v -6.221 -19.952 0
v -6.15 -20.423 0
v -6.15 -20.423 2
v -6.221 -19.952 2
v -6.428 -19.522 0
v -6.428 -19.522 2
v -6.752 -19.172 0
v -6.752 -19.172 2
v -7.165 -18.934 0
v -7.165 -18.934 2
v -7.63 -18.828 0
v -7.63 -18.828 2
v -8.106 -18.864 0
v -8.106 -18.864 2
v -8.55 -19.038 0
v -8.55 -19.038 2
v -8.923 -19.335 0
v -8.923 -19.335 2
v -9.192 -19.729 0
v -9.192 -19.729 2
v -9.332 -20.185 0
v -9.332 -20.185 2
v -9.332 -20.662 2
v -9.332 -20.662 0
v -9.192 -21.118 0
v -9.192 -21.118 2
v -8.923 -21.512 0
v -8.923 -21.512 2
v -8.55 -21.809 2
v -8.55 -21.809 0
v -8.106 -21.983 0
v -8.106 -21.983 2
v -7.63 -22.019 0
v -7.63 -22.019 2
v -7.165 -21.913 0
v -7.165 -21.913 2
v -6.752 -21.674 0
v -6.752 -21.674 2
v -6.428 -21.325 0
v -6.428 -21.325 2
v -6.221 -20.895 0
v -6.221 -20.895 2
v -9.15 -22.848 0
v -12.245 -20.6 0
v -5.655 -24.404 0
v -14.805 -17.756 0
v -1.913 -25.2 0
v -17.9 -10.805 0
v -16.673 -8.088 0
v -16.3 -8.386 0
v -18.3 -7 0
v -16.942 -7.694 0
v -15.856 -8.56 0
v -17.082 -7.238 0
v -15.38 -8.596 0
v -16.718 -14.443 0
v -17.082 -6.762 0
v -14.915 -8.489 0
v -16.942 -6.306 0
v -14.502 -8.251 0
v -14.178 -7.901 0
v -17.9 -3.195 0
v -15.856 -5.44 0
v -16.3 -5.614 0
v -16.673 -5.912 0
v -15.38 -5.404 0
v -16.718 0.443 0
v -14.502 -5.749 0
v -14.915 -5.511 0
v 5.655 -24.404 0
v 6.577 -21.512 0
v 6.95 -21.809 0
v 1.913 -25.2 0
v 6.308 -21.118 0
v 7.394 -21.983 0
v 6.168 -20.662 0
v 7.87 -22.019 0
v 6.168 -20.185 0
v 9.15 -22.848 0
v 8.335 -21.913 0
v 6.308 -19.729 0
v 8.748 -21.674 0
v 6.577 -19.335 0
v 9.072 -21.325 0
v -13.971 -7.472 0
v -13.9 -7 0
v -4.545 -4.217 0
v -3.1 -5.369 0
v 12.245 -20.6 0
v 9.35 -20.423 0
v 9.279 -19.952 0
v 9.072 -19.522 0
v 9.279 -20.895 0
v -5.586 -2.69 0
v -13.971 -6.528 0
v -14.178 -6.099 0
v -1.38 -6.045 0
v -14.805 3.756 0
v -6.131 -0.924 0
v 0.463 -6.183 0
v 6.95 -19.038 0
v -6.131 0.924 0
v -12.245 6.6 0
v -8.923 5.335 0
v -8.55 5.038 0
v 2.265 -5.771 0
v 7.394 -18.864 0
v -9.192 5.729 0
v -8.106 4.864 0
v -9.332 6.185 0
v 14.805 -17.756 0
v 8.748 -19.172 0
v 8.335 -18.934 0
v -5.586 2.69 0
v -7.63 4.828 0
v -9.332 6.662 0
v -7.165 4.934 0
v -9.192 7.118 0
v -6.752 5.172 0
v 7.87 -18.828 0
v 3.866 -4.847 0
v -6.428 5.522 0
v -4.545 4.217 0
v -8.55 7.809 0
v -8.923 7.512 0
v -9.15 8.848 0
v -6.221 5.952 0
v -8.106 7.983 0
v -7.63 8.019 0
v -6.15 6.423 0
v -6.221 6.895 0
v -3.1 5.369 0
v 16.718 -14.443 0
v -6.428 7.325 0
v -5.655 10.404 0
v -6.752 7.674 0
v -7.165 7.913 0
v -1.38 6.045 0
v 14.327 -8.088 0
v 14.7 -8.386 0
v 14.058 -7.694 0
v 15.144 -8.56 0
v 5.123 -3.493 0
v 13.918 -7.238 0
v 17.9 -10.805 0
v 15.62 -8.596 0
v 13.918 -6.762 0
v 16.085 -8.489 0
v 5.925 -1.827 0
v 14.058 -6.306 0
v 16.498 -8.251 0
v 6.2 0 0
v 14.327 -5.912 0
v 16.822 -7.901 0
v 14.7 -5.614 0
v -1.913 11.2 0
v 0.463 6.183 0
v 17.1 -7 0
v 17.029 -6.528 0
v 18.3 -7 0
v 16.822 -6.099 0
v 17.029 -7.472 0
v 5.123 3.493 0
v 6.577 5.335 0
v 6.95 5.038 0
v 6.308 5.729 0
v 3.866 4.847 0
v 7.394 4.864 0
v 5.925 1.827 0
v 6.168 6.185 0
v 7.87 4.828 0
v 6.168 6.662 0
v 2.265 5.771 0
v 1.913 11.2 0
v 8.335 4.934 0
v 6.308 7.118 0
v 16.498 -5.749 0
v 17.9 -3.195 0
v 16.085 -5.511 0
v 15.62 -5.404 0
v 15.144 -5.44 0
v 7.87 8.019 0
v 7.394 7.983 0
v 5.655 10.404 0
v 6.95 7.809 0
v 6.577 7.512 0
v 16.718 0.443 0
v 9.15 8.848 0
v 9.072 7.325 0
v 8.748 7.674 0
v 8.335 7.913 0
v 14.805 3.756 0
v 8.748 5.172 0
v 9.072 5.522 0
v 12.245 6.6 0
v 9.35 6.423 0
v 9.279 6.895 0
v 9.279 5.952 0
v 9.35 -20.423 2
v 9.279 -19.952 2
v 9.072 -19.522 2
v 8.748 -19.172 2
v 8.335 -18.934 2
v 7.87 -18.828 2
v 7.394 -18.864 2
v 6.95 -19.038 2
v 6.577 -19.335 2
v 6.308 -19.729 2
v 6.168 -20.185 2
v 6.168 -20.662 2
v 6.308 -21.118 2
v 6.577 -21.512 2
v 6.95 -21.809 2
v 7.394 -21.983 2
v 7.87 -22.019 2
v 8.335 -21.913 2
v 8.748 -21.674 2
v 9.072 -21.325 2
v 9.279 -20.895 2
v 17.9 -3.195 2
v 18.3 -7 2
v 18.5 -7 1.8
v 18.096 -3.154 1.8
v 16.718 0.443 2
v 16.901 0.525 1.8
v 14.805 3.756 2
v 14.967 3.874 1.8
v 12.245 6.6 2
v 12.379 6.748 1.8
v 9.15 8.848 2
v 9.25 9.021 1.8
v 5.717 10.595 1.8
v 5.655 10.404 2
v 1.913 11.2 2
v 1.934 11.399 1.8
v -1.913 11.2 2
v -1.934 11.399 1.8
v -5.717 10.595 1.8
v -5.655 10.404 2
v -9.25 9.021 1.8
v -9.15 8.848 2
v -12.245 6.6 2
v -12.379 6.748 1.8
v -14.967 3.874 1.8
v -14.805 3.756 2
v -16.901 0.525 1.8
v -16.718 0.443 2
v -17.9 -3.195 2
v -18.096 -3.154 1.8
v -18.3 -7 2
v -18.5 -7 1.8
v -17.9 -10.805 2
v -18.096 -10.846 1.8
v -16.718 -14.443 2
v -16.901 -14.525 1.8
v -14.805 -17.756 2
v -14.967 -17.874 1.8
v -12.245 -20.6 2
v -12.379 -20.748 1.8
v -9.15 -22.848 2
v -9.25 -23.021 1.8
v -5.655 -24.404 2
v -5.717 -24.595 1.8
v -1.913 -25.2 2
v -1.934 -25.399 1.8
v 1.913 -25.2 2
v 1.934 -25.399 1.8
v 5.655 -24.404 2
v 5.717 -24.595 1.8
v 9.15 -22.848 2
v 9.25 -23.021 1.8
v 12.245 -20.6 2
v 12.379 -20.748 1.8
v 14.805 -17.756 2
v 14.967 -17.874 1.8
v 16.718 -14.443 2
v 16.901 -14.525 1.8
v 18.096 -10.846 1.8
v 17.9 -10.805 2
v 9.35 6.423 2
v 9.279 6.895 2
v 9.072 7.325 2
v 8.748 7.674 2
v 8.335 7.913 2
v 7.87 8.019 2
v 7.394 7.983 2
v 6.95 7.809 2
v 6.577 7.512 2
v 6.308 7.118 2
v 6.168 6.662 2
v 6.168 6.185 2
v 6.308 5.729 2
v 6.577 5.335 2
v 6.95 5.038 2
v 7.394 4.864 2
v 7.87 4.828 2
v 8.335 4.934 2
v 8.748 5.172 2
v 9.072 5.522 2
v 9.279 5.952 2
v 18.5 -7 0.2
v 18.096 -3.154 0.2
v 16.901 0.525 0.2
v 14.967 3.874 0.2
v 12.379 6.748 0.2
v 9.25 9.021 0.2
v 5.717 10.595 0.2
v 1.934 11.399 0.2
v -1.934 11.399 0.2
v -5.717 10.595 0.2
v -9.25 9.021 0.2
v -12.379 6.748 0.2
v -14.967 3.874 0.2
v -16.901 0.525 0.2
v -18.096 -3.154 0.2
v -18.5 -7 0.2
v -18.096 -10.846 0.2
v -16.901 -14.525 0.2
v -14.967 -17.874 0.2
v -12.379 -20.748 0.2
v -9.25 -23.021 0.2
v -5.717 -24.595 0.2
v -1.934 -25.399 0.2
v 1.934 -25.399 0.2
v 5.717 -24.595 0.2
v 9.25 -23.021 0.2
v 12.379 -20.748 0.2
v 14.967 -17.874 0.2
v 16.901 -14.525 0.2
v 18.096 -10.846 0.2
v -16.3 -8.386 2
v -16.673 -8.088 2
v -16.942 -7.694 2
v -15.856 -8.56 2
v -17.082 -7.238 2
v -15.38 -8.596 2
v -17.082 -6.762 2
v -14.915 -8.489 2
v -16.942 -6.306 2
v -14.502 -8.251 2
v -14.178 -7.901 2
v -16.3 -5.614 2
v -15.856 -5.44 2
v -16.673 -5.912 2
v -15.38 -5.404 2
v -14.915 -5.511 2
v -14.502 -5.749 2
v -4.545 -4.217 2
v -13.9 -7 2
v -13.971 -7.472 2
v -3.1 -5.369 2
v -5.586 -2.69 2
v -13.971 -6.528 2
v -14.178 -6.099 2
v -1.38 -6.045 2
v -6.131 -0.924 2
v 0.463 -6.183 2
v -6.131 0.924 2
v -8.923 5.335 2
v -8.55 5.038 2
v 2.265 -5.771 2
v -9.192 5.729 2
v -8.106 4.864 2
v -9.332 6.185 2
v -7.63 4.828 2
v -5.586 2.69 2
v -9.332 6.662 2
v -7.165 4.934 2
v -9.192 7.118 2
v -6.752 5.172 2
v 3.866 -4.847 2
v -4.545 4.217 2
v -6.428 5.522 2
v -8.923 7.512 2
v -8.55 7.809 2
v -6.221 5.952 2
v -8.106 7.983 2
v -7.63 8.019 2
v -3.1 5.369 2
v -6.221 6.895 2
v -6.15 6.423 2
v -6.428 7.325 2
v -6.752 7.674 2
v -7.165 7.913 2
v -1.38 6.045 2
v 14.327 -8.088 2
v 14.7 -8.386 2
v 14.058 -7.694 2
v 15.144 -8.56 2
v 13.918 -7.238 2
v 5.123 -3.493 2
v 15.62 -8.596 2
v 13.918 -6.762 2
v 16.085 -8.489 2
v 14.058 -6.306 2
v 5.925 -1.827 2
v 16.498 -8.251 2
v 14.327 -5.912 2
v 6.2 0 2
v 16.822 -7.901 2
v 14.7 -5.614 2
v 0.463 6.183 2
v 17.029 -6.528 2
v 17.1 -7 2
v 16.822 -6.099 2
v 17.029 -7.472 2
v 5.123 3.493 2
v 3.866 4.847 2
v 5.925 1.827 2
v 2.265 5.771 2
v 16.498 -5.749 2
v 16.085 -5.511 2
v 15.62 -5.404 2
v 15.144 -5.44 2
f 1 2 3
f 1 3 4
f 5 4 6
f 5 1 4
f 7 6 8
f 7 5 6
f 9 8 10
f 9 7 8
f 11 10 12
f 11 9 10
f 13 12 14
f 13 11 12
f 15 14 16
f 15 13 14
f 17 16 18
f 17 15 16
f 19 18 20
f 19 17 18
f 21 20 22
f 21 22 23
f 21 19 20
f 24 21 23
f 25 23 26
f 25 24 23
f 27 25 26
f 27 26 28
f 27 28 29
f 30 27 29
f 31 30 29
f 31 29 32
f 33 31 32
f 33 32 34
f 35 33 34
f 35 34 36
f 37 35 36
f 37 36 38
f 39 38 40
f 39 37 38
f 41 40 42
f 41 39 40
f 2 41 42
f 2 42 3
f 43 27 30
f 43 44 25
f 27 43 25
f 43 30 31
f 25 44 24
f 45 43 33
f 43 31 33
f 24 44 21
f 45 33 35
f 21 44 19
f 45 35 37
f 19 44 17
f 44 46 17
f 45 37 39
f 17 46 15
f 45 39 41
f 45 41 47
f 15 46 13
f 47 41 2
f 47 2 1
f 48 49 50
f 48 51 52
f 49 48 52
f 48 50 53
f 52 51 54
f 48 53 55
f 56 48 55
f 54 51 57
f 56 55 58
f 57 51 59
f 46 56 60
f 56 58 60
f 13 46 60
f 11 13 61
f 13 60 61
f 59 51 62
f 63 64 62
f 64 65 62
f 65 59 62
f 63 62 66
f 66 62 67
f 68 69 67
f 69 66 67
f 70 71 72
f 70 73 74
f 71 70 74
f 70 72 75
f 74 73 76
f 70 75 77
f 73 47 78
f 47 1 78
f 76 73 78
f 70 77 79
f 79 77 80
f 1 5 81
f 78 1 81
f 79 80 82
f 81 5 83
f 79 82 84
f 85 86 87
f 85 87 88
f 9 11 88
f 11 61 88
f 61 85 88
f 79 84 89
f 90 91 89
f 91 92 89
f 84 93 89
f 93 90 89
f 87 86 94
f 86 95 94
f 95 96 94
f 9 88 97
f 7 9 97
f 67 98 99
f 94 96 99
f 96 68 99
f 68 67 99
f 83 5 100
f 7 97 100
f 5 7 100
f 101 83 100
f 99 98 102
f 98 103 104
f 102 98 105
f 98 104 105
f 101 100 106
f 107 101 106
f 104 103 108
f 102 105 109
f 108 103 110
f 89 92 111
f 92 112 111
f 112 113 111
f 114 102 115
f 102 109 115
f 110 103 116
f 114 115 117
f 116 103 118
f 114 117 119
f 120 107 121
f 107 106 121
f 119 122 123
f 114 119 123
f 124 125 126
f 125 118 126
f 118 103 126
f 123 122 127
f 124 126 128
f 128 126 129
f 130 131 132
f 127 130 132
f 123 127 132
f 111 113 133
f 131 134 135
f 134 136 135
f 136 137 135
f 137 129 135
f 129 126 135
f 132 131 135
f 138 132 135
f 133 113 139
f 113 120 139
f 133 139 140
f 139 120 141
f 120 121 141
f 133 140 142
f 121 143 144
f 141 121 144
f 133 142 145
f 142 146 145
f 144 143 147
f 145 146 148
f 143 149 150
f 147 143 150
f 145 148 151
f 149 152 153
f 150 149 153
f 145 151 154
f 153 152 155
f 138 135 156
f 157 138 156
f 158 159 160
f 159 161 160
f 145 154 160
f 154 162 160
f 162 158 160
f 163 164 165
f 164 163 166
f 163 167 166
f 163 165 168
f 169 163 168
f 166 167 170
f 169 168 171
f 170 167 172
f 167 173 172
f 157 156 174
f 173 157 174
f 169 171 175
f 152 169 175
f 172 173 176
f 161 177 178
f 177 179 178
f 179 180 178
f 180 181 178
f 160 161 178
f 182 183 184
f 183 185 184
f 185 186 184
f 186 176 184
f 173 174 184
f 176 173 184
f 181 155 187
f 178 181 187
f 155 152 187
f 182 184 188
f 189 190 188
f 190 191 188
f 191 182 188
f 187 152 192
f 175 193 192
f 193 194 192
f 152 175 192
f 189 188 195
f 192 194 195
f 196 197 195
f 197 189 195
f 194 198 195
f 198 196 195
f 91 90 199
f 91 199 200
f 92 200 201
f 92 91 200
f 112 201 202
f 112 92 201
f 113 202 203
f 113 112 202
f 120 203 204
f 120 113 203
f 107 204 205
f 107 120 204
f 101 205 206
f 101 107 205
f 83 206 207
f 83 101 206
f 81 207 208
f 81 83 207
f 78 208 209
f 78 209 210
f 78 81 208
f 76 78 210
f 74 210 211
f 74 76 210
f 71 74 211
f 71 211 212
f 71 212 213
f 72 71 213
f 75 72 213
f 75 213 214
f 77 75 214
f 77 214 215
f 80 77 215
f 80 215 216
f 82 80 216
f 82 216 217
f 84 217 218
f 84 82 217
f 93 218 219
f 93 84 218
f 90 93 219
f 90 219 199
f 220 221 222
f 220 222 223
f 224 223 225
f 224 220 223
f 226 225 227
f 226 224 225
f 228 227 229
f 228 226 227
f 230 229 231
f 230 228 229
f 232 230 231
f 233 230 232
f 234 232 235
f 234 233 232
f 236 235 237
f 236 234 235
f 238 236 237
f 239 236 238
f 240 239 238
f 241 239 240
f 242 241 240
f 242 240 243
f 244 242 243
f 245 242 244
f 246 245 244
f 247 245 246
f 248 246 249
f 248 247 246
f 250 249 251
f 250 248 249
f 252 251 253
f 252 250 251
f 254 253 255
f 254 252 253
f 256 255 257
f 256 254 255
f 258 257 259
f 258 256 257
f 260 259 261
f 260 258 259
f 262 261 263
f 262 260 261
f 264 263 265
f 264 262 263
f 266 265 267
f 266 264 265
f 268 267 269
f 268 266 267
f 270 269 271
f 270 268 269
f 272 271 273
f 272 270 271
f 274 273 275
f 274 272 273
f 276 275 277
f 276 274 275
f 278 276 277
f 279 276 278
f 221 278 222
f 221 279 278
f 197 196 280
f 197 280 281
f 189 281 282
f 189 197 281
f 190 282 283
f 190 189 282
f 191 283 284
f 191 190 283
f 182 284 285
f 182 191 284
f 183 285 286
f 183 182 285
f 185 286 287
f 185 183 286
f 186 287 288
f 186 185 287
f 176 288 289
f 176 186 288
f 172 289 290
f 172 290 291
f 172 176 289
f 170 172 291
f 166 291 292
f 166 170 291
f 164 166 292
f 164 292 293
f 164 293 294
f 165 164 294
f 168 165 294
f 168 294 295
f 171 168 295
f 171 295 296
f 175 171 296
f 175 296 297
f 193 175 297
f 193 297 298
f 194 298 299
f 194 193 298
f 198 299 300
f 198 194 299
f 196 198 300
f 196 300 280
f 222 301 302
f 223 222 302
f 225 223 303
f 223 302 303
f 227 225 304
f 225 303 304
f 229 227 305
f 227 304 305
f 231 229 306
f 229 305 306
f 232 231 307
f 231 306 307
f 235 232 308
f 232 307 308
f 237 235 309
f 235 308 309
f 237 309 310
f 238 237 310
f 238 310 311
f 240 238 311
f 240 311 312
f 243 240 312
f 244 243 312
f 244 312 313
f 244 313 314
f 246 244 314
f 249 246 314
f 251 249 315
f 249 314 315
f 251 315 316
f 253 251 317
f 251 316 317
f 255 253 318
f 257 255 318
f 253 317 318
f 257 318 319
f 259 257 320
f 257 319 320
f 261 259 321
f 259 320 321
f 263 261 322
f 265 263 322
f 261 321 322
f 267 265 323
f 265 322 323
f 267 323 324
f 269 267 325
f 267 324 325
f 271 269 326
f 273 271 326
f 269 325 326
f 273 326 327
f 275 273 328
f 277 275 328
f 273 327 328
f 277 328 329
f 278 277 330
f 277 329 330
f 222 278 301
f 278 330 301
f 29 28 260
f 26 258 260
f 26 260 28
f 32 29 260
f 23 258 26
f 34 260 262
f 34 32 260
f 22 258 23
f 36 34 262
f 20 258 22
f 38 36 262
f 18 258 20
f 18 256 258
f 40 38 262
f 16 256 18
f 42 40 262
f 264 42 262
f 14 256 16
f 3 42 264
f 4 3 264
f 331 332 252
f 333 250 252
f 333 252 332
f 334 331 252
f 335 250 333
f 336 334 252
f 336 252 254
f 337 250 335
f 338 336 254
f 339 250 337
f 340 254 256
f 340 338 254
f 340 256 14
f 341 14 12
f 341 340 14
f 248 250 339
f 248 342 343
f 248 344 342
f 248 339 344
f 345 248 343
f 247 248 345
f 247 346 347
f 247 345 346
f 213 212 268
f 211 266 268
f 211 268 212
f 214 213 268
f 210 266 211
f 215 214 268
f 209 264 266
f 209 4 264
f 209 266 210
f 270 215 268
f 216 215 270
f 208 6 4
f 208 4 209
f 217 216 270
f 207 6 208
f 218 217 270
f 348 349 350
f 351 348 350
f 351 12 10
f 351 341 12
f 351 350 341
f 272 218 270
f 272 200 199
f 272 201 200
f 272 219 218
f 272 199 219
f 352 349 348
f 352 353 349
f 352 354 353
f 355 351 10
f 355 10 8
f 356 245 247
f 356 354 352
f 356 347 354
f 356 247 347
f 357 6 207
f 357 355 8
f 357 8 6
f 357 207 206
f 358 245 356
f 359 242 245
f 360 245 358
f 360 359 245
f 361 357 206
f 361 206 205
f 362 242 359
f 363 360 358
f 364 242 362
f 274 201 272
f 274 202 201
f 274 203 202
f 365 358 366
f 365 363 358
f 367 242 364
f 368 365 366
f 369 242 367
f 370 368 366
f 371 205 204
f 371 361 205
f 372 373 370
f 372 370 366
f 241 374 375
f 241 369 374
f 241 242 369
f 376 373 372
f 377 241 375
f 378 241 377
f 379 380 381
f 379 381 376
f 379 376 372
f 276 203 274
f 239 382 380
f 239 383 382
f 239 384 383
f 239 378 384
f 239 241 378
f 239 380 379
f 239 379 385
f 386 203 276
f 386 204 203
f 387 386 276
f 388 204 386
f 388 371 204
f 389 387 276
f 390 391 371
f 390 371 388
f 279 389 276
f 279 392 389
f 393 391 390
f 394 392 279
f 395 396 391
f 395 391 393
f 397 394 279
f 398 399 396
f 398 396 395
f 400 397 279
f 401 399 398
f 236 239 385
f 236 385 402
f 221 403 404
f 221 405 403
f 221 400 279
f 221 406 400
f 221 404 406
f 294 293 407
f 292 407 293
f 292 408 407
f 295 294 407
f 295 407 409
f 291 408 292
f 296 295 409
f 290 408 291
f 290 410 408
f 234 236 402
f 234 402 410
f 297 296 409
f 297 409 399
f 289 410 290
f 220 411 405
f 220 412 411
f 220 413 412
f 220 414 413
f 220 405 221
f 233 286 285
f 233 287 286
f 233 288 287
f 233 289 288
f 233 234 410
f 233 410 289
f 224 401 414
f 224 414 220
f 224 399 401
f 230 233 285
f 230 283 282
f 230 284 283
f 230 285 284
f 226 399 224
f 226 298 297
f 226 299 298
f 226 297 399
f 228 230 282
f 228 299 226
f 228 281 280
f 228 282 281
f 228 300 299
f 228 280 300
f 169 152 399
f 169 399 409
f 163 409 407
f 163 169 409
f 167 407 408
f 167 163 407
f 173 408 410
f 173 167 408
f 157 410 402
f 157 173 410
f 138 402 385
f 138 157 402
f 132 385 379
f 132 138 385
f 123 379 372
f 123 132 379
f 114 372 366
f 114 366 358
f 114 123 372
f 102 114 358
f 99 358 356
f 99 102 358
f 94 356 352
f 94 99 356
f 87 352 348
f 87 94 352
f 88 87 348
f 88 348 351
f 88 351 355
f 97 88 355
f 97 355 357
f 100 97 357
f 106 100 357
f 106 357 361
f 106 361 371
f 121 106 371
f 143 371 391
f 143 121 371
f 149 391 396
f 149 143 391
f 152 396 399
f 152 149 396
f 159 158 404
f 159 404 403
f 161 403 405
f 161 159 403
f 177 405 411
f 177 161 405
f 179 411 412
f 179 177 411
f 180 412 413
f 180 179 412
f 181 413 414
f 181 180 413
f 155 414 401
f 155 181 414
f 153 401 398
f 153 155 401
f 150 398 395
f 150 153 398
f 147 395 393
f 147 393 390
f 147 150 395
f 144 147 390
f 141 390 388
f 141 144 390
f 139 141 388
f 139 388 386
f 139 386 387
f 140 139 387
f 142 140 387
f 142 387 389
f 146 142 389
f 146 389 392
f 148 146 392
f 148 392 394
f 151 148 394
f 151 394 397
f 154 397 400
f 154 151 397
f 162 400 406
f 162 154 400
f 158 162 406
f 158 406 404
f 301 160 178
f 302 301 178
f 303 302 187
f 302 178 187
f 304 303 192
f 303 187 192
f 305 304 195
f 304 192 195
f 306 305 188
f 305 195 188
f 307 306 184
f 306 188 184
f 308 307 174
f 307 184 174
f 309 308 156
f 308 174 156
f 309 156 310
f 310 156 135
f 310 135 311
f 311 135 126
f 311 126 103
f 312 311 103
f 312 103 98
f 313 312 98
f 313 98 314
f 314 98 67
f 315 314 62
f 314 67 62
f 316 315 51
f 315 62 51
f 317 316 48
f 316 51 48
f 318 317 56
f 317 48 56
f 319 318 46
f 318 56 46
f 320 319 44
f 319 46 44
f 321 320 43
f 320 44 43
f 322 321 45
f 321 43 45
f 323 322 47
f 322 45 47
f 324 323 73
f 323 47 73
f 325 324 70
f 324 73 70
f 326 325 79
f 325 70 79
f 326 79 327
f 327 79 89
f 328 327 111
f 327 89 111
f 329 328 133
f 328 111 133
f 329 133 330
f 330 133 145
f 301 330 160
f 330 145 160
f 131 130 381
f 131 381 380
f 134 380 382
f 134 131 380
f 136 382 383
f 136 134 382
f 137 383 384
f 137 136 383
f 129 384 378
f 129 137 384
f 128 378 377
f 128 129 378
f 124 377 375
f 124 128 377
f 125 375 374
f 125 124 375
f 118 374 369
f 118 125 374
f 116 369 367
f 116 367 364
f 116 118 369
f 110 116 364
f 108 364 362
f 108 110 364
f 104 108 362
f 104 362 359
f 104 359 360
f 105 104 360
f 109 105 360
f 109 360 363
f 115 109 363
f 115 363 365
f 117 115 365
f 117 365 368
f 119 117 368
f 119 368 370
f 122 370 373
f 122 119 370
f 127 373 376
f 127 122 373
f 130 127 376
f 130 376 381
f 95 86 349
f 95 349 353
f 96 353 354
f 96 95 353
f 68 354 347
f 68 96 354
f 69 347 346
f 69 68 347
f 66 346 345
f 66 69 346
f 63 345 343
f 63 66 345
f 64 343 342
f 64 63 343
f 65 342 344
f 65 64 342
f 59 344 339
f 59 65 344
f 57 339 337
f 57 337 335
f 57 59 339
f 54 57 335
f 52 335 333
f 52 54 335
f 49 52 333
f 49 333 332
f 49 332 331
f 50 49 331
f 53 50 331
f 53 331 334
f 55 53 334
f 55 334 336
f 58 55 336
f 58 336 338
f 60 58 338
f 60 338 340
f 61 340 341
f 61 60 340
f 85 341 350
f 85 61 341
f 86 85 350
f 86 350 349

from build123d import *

# Parameters (mm, degrees)
SKETCH_1_R      = 18.5
SKETCH_1_R_2    = 6.2
SKETCH_1_R_3    = 1.6
EXTRUDE_1_DEPTH = 2
CHAMFER_1_SIZE  = 0.2


with BuildPart() as part:
    # 草图1 → 凸台-拉伸1 (new body)
    with BuildSketch(Plane.XY):
        with Locations((0, -7)):
            Circle(SKETCH_1_R)
        Circle(SKETCH_1_R_2, mode=Mode.SUBTRACT)
        with Locations((15.5, -7)):
            Circle(SKETCH_1_R_3, mode=Mode.SUBTRACT)
        with Locations((7.75, -20.423393759)):
            Circle(SKETCH_1_R_3, mode=Mode.SUBTRACT)
        with Locations((-7.75, -20.423393759)):
            Circle(SKETCH_1_R_3, mode=Mode.SUBTRACT)
        with Locations((-15.5, -7)):
            Circle(SKETCH_1_R_3, mode=Mode.SUBTRACT)
        with Locations((-7.75, 6.423393759)):
            Circle(SKETCH_1_R_3, mode=Mode.SUBTRACT)
        with Locations((7.75, 6.423393759)):
            Circle(SKETCH_1_R_3, mode=Mode.SUBTRACT)
    extrude(amount=EXTRUDE_1_DEPTH)

    # 倒角1
    chamfer_1_edges = [part.edges().sort_by_distance(p)[0] for p in [
        (-18.5, -7, 0),
        (-18.5, -7, 2),
    ]]
    chamfer(chamfer_1_edges, length=CHAMFER_1_SIZE)


solid = part.part
